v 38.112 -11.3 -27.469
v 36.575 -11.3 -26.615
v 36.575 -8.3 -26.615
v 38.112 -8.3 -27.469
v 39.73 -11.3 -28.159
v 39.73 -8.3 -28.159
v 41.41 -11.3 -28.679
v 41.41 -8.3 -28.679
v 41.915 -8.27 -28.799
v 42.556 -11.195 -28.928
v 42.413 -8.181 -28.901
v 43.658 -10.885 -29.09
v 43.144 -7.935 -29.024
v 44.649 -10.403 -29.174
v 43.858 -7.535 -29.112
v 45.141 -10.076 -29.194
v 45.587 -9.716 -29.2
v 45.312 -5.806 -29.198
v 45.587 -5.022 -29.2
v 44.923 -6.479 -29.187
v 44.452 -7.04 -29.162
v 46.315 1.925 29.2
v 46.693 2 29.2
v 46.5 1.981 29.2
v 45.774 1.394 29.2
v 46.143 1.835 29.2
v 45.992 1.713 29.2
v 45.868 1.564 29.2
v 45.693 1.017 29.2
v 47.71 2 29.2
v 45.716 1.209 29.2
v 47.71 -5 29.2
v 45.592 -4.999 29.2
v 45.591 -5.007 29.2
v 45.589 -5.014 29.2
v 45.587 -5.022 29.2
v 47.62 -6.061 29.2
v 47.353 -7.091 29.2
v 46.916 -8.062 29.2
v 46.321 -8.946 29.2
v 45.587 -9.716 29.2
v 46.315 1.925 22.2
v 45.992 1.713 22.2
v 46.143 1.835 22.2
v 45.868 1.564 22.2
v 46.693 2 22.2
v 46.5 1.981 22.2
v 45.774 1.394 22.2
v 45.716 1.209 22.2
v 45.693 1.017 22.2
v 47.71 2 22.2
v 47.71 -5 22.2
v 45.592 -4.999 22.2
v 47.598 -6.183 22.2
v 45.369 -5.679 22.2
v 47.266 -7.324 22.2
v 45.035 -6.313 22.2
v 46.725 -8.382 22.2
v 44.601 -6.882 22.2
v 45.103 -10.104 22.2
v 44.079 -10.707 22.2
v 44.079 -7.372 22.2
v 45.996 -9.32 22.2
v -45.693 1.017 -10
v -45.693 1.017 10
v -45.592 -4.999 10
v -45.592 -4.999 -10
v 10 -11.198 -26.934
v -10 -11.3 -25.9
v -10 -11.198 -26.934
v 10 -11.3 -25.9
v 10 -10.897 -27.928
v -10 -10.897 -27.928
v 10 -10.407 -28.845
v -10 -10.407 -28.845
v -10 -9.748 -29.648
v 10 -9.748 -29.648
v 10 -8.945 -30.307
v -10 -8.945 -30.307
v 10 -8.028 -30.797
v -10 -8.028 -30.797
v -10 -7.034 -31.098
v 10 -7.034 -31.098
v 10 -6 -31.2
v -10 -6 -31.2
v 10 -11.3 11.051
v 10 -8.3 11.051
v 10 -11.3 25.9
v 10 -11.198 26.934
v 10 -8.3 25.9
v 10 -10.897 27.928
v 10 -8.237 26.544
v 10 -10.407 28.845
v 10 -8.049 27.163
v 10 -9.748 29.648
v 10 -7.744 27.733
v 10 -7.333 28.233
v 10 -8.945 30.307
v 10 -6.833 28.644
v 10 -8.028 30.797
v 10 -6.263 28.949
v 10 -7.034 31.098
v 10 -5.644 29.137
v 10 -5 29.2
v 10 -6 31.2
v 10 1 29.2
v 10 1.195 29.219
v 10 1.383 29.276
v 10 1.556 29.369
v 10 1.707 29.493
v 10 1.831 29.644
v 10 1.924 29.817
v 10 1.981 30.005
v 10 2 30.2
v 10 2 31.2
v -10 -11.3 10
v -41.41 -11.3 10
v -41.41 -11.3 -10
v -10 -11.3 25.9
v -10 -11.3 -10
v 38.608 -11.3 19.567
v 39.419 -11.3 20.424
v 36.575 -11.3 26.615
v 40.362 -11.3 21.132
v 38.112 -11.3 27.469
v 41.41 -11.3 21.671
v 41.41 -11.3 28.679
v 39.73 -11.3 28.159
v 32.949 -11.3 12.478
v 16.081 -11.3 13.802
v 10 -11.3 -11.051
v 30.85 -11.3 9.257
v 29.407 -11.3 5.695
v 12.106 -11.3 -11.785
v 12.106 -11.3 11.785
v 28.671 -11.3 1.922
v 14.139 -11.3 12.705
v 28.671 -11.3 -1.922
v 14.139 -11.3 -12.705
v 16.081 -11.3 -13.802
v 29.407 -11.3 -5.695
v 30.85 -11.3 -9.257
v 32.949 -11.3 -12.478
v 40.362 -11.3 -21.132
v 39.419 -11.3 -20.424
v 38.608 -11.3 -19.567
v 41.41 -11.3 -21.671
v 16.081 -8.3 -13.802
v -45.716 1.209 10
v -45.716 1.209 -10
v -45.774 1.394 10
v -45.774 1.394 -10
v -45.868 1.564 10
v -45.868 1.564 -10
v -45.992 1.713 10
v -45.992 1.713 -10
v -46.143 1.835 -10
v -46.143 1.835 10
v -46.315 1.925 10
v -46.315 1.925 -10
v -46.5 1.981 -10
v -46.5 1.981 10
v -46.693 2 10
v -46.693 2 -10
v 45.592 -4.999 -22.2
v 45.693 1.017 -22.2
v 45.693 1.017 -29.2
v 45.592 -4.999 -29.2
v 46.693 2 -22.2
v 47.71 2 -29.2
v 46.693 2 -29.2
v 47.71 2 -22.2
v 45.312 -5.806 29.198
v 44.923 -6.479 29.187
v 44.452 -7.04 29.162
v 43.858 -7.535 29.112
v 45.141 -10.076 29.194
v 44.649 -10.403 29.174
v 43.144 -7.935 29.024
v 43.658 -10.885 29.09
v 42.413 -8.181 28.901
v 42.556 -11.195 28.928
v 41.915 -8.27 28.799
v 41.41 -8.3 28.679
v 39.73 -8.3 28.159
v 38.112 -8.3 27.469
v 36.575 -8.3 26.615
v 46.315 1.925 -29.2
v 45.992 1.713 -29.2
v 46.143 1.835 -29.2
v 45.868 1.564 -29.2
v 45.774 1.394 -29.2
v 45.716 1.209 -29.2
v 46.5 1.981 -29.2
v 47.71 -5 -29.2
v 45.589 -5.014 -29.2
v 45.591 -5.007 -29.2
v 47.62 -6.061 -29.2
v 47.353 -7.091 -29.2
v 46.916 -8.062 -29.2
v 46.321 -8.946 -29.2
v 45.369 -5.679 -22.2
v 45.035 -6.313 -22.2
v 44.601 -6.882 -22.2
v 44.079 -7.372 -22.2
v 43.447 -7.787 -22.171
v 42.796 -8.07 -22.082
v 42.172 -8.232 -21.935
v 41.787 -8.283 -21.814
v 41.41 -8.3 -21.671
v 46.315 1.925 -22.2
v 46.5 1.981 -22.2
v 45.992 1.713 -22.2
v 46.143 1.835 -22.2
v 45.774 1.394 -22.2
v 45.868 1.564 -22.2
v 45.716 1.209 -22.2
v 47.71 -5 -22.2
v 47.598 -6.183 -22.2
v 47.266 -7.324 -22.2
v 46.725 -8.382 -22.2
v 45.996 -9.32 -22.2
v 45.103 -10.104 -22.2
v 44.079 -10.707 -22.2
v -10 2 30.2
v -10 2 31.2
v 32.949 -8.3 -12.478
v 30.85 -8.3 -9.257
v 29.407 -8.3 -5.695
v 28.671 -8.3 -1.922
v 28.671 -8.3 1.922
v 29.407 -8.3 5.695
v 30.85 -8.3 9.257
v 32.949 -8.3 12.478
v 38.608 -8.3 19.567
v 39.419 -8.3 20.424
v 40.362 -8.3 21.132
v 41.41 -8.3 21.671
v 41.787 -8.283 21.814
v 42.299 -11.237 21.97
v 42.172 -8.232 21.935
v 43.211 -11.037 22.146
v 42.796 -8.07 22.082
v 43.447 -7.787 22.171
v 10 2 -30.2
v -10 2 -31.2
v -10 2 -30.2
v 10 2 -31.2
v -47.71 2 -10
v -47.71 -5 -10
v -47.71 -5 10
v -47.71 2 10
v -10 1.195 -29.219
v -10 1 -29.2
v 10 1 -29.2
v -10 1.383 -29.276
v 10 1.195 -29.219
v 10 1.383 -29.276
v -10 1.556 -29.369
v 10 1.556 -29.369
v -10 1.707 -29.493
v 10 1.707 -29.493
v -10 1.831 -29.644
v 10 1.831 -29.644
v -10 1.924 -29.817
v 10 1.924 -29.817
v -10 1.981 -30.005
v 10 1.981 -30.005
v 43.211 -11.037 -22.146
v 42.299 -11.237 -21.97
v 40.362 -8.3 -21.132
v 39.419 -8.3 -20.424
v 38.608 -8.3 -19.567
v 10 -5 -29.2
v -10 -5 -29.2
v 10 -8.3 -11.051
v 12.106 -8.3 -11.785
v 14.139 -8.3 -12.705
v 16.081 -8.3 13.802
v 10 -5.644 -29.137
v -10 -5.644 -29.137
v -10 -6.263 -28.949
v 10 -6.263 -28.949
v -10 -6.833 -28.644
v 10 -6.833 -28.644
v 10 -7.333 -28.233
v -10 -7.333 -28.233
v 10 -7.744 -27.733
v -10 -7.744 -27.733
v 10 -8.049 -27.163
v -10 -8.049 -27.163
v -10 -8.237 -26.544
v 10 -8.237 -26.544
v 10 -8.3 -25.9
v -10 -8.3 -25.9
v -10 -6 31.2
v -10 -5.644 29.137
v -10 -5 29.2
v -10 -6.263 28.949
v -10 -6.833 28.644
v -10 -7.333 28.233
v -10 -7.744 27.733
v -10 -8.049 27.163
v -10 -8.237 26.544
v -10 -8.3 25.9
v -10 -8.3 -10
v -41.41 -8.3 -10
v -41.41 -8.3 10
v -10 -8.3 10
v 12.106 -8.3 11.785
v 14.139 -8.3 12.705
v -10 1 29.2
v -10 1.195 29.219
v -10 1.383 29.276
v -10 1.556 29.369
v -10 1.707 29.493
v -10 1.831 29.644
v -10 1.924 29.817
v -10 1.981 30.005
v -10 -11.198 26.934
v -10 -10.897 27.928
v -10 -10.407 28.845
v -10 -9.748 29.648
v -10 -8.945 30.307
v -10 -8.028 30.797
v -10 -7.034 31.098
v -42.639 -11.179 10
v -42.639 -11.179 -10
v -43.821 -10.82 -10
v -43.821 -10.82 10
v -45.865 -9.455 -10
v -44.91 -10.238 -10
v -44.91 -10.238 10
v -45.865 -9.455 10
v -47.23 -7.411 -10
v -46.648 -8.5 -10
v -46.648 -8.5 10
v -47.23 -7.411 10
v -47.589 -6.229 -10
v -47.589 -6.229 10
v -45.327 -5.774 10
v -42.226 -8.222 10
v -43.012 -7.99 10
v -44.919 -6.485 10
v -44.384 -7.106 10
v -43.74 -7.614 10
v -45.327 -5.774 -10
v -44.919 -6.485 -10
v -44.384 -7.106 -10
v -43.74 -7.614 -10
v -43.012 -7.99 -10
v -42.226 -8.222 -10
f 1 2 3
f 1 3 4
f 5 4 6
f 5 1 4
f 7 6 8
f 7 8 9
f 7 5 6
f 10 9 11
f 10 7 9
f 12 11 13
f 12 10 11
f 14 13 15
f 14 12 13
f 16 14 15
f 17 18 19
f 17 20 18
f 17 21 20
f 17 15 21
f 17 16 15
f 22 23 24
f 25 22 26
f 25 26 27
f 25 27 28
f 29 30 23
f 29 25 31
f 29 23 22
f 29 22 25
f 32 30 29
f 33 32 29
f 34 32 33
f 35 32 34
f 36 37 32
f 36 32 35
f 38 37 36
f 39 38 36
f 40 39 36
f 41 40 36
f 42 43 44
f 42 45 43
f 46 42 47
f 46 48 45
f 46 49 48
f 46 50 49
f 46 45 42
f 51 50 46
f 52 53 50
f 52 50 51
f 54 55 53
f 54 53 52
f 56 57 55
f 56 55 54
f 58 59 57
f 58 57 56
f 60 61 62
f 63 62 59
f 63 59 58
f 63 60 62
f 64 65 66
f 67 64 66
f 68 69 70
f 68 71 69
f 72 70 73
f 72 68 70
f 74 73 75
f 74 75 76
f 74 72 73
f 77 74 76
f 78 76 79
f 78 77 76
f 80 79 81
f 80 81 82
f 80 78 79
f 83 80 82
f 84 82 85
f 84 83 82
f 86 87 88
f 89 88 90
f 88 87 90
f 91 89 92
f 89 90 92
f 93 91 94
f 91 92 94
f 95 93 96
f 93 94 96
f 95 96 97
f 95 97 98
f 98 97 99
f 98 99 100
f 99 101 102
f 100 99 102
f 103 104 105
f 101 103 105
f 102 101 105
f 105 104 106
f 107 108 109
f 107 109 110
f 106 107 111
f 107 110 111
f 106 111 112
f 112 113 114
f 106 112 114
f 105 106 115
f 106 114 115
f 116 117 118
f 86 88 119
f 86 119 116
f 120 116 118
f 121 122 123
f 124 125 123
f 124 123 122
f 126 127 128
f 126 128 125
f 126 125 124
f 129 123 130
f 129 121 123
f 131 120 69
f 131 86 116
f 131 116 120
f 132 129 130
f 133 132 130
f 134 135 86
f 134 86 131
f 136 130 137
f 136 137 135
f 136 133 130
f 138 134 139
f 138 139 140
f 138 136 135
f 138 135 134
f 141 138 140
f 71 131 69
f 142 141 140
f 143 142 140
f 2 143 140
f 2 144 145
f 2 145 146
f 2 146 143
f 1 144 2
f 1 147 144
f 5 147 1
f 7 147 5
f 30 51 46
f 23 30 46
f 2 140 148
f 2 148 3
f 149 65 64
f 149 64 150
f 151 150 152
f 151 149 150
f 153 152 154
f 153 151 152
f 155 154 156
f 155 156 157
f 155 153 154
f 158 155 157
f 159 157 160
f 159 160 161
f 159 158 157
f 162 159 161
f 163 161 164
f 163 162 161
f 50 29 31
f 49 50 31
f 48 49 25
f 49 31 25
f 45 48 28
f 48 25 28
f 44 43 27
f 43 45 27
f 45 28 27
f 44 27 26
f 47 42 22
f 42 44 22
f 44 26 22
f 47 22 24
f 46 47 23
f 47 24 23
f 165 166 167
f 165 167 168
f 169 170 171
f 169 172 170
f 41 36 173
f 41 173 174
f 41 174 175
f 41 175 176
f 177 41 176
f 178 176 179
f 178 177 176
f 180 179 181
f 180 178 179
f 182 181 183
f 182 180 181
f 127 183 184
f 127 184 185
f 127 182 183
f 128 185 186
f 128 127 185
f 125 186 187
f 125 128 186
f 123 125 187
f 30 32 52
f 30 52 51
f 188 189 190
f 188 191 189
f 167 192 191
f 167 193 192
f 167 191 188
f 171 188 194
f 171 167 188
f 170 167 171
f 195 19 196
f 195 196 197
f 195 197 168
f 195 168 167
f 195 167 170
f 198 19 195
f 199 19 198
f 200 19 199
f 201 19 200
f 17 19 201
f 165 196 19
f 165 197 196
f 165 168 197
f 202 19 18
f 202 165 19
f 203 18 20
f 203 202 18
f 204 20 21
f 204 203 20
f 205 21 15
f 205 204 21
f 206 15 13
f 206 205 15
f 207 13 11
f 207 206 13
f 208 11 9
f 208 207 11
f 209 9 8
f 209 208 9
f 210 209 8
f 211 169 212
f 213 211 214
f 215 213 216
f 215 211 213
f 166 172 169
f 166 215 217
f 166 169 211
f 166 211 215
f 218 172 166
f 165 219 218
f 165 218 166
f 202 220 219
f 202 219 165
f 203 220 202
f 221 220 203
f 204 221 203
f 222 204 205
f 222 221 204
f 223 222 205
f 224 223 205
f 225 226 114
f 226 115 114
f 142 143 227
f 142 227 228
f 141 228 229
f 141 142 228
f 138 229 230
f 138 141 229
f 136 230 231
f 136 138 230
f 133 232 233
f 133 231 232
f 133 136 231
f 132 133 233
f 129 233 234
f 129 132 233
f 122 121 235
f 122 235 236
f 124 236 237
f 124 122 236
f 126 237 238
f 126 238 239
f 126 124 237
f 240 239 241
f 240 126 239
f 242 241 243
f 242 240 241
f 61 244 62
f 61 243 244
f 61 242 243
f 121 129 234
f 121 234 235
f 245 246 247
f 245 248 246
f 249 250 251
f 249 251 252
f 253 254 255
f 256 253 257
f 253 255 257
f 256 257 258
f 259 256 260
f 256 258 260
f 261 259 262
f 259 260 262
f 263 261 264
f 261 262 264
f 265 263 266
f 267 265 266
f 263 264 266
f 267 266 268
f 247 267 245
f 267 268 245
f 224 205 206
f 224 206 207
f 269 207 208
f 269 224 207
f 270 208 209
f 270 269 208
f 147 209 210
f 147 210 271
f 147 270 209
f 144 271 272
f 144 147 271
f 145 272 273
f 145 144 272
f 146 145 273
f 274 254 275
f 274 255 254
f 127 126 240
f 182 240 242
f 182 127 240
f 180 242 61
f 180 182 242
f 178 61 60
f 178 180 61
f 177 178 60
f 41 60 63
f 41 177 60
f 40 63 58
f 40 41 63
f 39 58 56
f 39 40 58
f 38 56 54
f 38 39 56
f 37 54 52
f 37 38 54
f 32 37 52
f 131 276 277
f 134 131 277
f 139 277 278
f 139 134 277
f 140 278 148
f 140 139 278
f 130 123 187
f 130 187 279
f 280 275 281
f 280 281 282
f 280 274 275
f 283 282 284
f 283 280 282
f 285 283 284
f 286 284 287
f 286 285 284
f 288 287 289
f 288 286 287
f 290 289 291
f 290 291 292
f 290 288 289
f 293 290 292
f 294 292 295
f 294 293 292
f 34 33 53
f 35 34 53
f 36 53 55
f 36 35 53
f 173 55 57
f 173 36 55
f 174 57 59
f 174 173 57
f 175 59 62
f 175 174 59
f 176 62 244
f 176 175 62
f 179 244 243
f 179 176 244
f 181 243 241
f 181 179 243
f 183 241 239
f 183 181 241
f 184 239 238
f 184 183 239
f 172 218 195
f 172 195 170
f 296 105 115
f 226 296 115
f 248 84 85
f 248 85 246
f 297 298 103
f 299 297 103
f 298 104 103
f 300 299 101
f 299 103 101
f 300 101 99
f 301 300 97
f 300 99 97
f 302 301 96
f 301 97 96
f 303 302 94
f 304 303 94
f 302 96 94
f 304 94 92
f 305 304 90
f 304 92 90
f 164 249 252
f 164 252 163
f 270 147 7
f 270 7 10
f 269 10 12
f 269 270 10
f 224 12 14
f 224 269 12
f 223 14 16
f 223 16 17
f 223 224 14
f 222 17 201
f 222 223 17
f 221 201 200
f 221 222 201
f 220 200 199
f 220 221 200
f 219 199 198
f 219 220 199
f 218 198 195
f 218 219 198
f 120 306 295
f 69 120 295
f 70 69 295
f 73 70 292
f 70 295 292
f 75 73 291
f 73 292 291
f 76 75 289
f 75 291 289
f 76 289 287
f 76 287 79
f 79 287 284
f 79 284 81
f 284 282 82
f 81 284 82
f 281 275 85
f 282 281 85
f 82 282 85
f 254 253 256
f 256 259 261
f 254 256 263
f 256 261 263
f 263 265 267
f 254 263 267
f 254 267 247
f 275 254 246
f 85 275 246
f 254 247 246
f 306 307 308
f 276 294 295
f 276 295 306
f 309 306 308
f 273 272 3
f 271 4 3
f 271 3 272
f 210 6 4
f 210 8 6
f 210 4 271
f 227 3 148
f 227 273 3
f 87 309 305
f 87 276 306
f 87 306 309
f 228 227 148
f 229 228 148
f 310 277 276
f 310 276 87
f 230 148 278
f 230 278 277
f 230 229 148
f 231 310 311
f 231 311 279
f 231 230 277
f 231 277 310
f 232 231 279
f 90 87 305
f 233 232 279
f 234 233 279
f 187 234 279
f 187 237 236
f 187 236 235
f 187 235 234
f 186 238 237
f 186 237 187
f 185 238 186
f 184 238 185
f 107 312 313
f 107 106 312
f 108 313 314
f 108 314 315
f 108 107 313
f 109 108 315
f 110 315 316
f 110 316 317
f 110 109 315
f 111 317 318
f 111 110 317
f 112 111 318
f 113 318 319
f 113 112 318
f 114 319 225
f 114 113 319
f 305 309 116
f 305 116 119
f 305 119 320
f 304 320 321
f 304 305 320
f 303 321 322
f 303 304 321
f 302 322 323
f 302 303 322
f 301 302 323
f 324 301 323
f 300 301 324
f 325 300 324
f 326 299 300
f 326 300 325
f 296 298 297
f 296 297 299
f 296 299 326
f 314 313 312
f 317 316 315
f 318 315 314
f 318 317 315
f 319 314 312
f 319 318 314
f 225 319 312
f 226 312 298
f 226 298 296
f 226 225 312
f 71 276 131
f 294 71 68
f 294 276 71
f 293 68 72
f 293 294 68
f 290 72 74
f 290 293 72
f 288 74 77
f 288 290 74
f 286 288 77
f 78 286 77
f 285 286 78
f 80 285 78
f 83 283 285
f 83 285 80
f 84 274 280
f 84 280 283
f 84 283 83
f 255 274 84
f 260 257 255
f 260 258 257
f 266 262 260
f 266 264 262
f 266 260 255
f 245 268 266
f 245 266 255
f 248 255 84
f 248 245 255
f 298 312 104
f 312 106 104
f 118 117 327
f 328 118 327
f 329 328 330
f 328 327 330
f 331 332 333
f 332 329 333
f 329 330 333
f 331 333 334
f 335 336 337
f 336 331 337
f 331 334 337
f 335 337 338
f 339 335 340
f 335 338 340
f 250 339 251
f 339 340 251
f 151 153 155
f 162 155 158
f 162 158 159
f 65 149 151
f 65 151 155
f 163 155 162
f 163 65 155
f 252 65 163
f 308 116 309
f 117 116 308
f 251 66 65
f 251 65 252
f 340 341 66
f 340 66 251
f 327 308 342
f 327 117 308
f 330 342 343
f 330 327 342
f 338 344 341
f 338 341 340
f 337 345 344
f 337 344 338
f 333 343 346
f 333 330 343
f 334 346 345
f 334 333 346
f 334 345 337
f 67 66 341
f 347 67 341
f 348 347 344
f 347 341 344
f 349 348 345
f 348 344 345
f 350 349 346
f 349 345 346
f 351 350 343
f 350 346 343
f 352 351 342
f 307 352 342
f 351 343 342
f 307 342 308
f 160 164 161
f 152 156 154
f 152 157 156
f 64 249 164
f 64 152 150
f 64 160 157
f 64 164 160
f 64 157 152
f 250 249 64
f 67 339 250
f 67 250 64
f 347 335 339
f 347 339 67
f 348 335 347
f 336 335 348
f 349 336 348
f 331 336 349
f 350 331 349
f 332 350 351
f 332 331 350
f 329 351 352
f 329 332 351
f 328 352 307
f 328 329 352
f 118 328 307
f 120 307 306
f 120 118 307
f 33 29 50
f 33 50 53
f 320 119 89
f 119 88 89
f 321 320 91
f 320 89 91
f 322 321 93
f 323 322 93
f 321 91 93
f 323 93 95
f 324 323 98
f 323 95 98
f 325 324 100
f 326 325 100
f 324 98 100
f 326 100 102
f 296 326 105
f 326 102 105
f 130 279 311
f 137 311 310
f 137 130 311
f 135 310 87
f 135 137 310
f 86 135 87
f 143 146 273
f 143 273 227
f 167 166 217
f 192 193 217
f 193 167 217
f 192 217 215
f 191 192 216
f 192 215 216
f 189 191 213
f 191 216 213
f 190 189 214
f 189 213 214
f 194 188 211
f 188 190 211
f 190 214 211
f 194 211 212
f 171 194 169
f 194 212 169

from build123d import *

# Parameters (mm, degrees)
BOSS_EXTRUDE1_DEPTH     = 30
FILLET2_R               = 1
FILLET2_OF_MIRROR4_R    = 1
CUT_EXTRUDE2_DEPTH      = 10.3
CUT_EXTRUDE2_DEPTH_BACK = 3
SKETCH4_OUTSIDE_W       = 120.12
SKETCH4_OUTSIDE_H       = 84.7
BOSS_EXTRUDE2_DEPTH     = 10
FILLET1_R               = 1
FILLET1_OF_MIRROR3_R    = 1


with BuildPart() as part:
    # Sketch3 → Boss-Extrude1 (new, symmetric)
    with BuildSketch(Plane.XY):
        with BuildLine():
            Line((-45.71, 2), (-45.59234107, -4.9990111))
            ThreePointArc((-45.59234107, -4.9990111), (-44.074043193, -7.375333149), (-41.41, -8.3))
            Line((-41.41, -8.3), (0, -8.3))
            Line((0, -8.3), (0, -11.3))
            Line((0, -11.3), (-41.41, -11.3))
            ThreePointArc((-41.41, -11.3), (-45.864772721, -9.454772721), (-47.71, -5))
            Line((-47.71, -5), (-47.71, 2))
            Line((-47.71, 2), (-45.71, 2))
        make_face()
    boss_extrude1 = extrude(amount=BOSS_EXTRUDE1_DEPTH, both=True)

    # Fillet2
    fillet2_edges = [part.edges().sort_by_distance(p)[0] for p in [
        (-45.71, 2, 0),
    ]]
    fillet(fillet2_edges, radius=FILLET2_R)

    # Mirror4: Boss-Extrude1 across plane
    add(boss_extrude1.mirror(Plane(origin=(0, 0, 0), x_dir=(0, 0, 1), z_dir=(1, 0, 0))))

    # Fillet2 of Mirror4
    fillet2_of_mirror4_edges = [part.edges().sort_by_distance(p)[0] for p in [
        (45.71, 2, 0),
    ]]
    fillet(fillet2_of_mirror4_edges, radius=FILLET2_OF_MIRROR4_R)

    # Sketch4 outside → Cut-Extrude2 (cut, two sides: drawn at the far end of the back side and taken through both)
    with BuildSketch(Plane(origin=(0, -8.3, 0), x_dir=(1, 0, 0), z_dir=(0, 1, 0)).offset(-CUT_EXTRUDE2_DEPTH_BACK)):
        Rectangle(SKETCH4_OUTSIDE_W, SKETCH4_OUTSIDE_H)
        with BuildLine():
            Line((-47.71, 10), (2.828114646, 10))
            ThreePointArc((2.828114646, 10), (9.721935767, 10.969285688), (16.081190316, 13.801981572))
            Line((16.081190316, 13.801981572), (36.574790585, 26.614652531))
            ThreePointArc((36.574790585, 26.614652531), (40.899083679, 28.540885732), (45.586882041, 29.2))
            Line((45.586882041, 29.2), (47.71, 29.2))
            Line((47.71, 29.2), (47.71, 22.2))
            Line((47.71, 22.2), (44.078732881, 22.2))
            ThreePointArc((44.078732881, 22.2), (41.043221434, 21.507588307), (38.608231021, 19.567334358))
            Line((38.608231021, 19.567334358), (32.948592182, 12.478098166))
            ThreePointArc((32.948592182, 12.478098166), (28.578597498, 0), (32.948592182, -12.478098166))
            Line((32.948592182, -12.478098166), (38.608231021, -19.567334358))
            ThreePointArc((38.608231021, -19.567334358), (41.043221434, -21.507588307), (44.078732881, -22.2))
            Line((44.078732881, -22.2), (47.71, -22.2))
            Line((47.71, -22.2), (47.71, -29.2))
            Line((47.71, -29.2), (45.586882041, -29.2))
            ThreePointArc((45.586882041, -29.2), (40.899083679, -28.540885732), (36.574790585, -26.614652531))
            Line((36.574790585, -26.614652531), (16.081190316, -13.801981572))
            ThreePointArc((16.081190316, -13.801981572), (9.721935767, -10.969285688), (2.828114646, -10))
            Line((2.828114646, -10), (-47.71, -10))
            Line((-47.71, -10), (-47.71, 10))
        make_face(mode=Mode.SUBTRACT)
    extrude(amount=CUT_EXTRUDE2_DEPTH + CUT_EXTRUDE2_DEPTH_BACK, mode=Mode.SUBTRACT)

    # Sketch2 → Boss-Extrude2 (add, symmetric)
    with BuildSketch(Plane(origin=(0, 0, 0), x_dir=(0, 0, -1), z_dir=(1, 0, 0))):
        with BuildLine():
            Line((-29.2, 2), (-29.2, -5))
            ThreePointArc((-29.2, -5), (-28.233452378, -7.333452378), (-25.9, -8.3))
            Line((-25.9, -8.3), (0, -8.3))
            Line((0, -8.3), (0, -11.3))
            Line((0, -11.3), (-25.9, -11.3))
            ThreePointArc((-25.9, -11.3), (-29.64766594, -9.74766594), (-31.2, -6))
            Line((-31.2, -6), (-31.2, 2))
            Line((-31.2, 2), (-29.2, 2))
        make_face()
    boss_extrude2 = extrude(amount=BOSS_EXTRUDE2_DEPTH, both=True)

    # Fillet1
    fillet1_edges = [part.edges().sort_by_distance(p)[0] for p in [
        (0, 2, 29.2),
    ]]
    fillet(fillet1_edges, radius=FILLET1_R)

    # Mirror3: Boss-Extrude2 across plane
    add(boss_extrude2.mirror(Plane.XY))

    # Fillet1 of Mirror3
    fillet1_of_mirror3_edges = [part.edges().sort_by_distance(p)[0] for p in [
        (0, 2, -29.2),
    ]]
    fillet(fillet1_of_mirror3_edges, radius=FILLET1_OF_MIRROR3_R)


solid = part.part
